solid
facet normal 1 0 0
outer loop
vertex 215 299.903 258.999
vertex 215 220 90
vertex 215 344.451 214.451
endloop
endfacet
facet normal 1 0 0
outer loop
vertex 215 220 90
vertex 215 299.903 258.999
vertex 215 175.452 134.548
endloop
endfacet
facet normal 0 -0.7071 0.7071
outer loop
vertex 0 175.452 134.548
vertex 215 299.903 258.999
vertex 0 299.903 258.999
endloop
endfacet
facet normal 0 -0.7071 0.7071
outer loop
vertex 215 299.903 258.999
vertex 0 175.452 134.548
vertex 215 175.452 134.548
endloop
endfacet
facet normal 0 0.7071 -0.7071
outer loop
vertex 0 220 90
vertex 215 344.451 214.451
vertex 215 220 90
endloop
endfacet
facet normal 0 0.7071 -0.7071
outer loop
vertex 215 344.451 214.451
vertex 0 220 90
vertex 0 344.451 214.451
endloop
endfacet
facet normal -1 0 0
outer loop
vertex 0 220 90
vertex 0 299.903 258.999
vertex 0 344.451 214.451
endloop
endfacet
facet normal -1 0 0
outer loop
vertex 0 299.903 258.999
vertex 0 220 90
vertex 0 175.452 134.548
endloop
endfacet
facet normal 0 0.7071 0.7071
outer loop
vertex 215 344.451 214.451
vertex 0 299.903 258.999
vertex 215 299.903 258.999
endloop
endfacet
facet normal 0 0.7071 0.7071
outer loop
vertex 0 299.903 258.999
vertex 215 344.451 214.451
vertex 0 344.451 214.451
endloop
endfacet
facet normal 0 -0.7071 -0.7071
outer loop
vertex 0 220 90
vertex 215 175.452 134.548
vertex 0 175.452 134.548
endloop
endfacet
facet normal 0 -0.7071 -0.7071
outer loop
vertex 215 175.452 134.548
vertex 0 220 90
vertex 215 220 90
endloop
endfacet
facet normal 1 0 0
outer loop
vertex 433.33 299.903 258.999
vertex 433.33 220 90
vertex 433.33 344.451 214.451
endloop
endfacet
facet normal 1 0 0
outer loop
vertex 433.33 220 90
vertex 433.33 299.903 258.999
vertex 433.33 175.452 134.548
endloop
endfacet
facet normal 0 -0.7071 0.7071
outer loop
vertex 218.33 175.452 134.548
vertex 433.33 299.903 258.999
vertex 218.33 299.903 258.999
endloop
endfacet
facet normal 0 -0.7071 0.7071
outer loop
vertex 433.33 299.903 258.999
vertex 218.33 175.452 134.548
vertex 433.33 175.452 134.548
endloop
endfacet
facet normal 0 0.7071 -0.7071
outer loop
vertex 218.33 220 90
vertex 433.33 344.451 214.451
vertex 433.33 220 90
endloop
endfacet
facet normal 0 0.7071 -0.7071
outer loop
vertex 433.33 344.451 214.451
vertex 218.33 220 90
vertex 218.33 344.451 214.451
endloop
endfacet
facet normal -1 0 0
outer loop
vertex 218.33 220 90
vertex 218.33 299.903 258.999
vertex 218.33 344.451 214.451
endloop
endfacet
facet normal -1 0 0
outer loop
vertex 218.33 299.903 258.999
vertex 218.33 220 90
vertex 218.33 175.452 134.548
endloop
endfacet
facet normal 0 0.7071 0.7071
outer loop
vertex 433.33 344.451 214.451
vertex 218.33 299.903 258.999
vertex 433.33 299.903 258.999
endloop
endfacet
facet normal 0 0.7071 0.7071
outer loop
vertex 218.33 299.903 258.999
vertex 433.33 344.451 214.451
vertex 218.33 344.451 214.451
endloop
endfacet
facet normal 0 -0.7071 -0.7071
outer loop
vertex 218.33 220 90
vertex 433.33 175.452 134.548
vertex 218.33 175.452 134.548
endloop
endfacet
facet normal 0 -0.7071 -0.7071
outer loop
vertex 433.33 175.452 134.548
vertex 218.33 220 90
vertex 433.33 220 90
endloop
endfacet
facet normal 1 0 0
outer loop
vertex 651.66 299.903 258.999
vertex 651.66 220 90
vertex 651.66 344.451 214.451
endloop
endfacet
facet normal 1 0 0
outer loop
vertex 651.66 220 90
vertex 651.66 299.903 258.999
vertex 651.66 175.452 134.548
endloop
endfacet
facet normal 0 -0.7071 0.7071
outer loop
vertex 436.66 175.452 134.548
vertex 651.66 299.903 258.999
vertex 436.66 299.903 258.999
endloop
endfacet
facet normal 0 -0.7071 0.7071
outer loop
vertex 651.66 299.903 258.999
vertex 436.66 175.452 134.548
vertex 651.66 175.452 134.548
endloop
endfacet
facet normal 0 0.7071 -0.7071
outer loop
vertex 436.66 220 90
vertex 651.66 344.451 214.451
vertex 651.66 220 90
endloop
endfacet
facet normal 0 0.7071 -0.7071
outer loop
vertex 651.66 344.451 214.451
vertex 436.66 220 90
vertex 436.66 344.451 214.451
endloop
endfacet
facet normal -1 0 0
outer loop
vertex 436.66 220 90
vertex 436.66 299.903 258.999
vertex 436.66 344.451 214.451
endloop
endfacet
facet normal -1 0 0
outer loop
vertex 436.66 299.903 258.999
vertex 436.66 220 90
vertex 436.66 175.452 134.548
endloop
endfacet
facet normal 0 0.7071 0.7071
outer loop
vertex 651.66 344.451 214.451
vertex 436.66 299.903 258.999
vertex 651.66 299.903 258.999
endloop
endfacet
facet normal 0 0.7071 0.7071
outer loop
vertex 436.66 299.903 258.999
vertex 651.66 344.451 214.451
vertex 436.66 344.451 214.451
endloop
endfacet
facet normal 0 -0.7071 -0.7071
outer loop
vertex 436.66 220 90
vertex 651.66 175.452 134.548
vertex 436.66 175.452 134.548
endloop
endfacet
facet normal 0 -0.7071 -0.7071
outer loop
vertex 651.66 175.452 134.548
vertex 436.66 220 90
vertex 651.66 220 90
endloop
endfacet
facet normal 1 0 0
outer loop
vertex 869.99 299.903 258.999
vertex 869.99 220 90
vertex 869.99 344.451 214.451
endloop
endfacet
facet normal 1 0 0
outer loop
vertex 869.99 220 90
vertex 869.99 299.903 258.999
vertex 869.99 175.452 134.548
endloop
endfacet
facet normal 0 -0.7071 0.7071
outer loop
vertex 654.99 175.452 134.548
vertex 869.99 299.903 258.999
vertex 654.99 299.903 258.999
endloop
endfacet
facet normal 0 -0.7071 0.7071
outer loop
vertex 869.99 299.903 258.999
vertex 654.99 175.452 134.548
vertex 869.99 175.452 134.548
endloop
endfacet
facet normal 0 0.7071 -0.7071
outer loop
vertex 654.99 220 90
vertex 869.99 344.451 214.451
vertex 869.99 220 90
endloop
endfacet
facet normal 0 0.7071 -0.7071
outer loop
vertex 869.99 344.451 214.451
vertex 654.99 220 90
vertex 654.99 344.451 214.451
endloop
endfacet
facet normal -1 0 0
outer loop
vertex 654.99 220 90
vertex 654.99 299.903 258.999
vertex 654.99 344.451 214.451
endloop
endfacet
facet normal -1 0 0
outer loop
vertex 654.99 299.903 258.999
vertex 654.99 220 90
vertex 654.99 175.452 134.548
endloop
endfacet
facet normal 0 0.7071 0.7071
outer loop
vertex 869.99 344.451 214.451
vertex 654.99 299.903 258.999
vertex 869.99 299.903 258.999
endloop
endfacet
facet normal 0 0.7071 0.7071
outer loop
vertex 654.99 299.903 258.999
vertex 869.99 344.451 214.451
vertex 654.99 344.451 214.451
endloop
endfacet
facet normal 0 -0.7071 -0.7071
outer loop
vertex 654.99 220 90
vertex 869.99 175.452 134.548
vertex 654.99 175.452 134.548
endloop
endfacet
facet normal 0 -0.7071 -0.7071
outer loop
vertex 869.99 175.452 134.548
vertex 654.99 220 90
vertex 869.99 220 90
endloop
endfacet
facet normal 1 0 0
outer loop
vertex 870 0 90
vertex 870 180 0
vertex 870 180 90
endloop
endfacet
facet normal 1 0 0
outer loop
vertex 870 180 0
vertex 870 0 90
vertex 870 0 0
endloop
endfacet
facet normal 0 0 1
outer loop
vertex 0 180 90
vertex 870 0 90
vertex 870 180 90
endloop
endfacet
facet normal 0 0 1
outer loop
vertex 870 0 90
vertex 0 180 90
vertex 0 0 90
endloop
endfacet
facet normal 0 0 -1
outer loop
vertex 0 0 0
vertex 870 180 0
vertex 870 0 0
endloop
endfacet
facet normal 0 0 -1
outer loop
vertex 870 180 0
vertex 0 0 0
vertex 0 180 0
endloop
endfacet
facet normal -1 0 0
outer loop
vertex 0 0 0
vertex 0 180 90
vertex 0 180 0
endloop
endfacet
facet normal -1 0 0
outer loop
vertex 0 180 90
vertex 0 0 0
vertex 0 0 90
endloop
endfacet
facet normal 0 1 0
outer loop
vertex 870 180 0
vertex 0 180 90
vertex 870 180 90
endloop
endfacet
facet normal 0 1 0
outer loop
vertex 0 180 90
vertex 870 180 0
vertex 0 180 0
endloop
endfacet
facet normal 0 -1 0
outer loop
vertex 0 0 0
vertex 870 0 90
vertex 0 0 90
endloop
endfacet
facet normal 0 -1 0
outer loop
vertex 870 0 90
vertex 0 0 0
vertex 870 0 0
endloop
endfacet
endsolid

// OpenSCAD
function digi_box_width() = 215;
function digi_box_height() = 176;
function digi_box_depth() = 63;

module digi(box_color, label) {
  width = digi_box_width();
  depth = digi_box_height();
  height = digi_box_depth();

  union() {
    color(box_color) cube([ width, depth, height ]);

    if (label) {
      translate([ width / 2, depth / 2, height ]) color("white")
          text(label, halign = "center", valign = "center");
    }
  }
}

module digitone() { digi("#4a919e", "Digitone"); }

module syntakt() { digi("#bf5258", "Syntakt"); }

module digitakt() { digi("#df9863", "Digitakt"); }

module analog_heat() { digi("#adb2b5", "Analog Heat"); }

function digitone_keys_width() = 870;
function digitone_keys_height() = 90;
function digitone_keys_depth() = 180;

module digitone_keys() {
  width = digitone_keys_width();
  height = digitone_keys_height();
  depth = digitone_keys_depth();

  union() {
    color("#4a919e") cube([ width, depth, height ]);
    translate([ width / 2, depth / 2, height ]) color("white")
        text("Digitone Keys", halign = "center", valign = "center");
  }
}

translate(v = [ 0, 220, 90 ]) rotate(a = [ 45, 0, 0 ]) {
  digitone();

  translate(v = [ 215 + 3.33, 0, 0 ]) digitakt();

  translate(v = [ 215 * 2 + 3.33 * 2, 0, 0 ]) analog_heat();

  translate(v = [ 215 * 3 + 3.33 * 3, 0, 0 ]) syntakt();
}

digitone_keys();
